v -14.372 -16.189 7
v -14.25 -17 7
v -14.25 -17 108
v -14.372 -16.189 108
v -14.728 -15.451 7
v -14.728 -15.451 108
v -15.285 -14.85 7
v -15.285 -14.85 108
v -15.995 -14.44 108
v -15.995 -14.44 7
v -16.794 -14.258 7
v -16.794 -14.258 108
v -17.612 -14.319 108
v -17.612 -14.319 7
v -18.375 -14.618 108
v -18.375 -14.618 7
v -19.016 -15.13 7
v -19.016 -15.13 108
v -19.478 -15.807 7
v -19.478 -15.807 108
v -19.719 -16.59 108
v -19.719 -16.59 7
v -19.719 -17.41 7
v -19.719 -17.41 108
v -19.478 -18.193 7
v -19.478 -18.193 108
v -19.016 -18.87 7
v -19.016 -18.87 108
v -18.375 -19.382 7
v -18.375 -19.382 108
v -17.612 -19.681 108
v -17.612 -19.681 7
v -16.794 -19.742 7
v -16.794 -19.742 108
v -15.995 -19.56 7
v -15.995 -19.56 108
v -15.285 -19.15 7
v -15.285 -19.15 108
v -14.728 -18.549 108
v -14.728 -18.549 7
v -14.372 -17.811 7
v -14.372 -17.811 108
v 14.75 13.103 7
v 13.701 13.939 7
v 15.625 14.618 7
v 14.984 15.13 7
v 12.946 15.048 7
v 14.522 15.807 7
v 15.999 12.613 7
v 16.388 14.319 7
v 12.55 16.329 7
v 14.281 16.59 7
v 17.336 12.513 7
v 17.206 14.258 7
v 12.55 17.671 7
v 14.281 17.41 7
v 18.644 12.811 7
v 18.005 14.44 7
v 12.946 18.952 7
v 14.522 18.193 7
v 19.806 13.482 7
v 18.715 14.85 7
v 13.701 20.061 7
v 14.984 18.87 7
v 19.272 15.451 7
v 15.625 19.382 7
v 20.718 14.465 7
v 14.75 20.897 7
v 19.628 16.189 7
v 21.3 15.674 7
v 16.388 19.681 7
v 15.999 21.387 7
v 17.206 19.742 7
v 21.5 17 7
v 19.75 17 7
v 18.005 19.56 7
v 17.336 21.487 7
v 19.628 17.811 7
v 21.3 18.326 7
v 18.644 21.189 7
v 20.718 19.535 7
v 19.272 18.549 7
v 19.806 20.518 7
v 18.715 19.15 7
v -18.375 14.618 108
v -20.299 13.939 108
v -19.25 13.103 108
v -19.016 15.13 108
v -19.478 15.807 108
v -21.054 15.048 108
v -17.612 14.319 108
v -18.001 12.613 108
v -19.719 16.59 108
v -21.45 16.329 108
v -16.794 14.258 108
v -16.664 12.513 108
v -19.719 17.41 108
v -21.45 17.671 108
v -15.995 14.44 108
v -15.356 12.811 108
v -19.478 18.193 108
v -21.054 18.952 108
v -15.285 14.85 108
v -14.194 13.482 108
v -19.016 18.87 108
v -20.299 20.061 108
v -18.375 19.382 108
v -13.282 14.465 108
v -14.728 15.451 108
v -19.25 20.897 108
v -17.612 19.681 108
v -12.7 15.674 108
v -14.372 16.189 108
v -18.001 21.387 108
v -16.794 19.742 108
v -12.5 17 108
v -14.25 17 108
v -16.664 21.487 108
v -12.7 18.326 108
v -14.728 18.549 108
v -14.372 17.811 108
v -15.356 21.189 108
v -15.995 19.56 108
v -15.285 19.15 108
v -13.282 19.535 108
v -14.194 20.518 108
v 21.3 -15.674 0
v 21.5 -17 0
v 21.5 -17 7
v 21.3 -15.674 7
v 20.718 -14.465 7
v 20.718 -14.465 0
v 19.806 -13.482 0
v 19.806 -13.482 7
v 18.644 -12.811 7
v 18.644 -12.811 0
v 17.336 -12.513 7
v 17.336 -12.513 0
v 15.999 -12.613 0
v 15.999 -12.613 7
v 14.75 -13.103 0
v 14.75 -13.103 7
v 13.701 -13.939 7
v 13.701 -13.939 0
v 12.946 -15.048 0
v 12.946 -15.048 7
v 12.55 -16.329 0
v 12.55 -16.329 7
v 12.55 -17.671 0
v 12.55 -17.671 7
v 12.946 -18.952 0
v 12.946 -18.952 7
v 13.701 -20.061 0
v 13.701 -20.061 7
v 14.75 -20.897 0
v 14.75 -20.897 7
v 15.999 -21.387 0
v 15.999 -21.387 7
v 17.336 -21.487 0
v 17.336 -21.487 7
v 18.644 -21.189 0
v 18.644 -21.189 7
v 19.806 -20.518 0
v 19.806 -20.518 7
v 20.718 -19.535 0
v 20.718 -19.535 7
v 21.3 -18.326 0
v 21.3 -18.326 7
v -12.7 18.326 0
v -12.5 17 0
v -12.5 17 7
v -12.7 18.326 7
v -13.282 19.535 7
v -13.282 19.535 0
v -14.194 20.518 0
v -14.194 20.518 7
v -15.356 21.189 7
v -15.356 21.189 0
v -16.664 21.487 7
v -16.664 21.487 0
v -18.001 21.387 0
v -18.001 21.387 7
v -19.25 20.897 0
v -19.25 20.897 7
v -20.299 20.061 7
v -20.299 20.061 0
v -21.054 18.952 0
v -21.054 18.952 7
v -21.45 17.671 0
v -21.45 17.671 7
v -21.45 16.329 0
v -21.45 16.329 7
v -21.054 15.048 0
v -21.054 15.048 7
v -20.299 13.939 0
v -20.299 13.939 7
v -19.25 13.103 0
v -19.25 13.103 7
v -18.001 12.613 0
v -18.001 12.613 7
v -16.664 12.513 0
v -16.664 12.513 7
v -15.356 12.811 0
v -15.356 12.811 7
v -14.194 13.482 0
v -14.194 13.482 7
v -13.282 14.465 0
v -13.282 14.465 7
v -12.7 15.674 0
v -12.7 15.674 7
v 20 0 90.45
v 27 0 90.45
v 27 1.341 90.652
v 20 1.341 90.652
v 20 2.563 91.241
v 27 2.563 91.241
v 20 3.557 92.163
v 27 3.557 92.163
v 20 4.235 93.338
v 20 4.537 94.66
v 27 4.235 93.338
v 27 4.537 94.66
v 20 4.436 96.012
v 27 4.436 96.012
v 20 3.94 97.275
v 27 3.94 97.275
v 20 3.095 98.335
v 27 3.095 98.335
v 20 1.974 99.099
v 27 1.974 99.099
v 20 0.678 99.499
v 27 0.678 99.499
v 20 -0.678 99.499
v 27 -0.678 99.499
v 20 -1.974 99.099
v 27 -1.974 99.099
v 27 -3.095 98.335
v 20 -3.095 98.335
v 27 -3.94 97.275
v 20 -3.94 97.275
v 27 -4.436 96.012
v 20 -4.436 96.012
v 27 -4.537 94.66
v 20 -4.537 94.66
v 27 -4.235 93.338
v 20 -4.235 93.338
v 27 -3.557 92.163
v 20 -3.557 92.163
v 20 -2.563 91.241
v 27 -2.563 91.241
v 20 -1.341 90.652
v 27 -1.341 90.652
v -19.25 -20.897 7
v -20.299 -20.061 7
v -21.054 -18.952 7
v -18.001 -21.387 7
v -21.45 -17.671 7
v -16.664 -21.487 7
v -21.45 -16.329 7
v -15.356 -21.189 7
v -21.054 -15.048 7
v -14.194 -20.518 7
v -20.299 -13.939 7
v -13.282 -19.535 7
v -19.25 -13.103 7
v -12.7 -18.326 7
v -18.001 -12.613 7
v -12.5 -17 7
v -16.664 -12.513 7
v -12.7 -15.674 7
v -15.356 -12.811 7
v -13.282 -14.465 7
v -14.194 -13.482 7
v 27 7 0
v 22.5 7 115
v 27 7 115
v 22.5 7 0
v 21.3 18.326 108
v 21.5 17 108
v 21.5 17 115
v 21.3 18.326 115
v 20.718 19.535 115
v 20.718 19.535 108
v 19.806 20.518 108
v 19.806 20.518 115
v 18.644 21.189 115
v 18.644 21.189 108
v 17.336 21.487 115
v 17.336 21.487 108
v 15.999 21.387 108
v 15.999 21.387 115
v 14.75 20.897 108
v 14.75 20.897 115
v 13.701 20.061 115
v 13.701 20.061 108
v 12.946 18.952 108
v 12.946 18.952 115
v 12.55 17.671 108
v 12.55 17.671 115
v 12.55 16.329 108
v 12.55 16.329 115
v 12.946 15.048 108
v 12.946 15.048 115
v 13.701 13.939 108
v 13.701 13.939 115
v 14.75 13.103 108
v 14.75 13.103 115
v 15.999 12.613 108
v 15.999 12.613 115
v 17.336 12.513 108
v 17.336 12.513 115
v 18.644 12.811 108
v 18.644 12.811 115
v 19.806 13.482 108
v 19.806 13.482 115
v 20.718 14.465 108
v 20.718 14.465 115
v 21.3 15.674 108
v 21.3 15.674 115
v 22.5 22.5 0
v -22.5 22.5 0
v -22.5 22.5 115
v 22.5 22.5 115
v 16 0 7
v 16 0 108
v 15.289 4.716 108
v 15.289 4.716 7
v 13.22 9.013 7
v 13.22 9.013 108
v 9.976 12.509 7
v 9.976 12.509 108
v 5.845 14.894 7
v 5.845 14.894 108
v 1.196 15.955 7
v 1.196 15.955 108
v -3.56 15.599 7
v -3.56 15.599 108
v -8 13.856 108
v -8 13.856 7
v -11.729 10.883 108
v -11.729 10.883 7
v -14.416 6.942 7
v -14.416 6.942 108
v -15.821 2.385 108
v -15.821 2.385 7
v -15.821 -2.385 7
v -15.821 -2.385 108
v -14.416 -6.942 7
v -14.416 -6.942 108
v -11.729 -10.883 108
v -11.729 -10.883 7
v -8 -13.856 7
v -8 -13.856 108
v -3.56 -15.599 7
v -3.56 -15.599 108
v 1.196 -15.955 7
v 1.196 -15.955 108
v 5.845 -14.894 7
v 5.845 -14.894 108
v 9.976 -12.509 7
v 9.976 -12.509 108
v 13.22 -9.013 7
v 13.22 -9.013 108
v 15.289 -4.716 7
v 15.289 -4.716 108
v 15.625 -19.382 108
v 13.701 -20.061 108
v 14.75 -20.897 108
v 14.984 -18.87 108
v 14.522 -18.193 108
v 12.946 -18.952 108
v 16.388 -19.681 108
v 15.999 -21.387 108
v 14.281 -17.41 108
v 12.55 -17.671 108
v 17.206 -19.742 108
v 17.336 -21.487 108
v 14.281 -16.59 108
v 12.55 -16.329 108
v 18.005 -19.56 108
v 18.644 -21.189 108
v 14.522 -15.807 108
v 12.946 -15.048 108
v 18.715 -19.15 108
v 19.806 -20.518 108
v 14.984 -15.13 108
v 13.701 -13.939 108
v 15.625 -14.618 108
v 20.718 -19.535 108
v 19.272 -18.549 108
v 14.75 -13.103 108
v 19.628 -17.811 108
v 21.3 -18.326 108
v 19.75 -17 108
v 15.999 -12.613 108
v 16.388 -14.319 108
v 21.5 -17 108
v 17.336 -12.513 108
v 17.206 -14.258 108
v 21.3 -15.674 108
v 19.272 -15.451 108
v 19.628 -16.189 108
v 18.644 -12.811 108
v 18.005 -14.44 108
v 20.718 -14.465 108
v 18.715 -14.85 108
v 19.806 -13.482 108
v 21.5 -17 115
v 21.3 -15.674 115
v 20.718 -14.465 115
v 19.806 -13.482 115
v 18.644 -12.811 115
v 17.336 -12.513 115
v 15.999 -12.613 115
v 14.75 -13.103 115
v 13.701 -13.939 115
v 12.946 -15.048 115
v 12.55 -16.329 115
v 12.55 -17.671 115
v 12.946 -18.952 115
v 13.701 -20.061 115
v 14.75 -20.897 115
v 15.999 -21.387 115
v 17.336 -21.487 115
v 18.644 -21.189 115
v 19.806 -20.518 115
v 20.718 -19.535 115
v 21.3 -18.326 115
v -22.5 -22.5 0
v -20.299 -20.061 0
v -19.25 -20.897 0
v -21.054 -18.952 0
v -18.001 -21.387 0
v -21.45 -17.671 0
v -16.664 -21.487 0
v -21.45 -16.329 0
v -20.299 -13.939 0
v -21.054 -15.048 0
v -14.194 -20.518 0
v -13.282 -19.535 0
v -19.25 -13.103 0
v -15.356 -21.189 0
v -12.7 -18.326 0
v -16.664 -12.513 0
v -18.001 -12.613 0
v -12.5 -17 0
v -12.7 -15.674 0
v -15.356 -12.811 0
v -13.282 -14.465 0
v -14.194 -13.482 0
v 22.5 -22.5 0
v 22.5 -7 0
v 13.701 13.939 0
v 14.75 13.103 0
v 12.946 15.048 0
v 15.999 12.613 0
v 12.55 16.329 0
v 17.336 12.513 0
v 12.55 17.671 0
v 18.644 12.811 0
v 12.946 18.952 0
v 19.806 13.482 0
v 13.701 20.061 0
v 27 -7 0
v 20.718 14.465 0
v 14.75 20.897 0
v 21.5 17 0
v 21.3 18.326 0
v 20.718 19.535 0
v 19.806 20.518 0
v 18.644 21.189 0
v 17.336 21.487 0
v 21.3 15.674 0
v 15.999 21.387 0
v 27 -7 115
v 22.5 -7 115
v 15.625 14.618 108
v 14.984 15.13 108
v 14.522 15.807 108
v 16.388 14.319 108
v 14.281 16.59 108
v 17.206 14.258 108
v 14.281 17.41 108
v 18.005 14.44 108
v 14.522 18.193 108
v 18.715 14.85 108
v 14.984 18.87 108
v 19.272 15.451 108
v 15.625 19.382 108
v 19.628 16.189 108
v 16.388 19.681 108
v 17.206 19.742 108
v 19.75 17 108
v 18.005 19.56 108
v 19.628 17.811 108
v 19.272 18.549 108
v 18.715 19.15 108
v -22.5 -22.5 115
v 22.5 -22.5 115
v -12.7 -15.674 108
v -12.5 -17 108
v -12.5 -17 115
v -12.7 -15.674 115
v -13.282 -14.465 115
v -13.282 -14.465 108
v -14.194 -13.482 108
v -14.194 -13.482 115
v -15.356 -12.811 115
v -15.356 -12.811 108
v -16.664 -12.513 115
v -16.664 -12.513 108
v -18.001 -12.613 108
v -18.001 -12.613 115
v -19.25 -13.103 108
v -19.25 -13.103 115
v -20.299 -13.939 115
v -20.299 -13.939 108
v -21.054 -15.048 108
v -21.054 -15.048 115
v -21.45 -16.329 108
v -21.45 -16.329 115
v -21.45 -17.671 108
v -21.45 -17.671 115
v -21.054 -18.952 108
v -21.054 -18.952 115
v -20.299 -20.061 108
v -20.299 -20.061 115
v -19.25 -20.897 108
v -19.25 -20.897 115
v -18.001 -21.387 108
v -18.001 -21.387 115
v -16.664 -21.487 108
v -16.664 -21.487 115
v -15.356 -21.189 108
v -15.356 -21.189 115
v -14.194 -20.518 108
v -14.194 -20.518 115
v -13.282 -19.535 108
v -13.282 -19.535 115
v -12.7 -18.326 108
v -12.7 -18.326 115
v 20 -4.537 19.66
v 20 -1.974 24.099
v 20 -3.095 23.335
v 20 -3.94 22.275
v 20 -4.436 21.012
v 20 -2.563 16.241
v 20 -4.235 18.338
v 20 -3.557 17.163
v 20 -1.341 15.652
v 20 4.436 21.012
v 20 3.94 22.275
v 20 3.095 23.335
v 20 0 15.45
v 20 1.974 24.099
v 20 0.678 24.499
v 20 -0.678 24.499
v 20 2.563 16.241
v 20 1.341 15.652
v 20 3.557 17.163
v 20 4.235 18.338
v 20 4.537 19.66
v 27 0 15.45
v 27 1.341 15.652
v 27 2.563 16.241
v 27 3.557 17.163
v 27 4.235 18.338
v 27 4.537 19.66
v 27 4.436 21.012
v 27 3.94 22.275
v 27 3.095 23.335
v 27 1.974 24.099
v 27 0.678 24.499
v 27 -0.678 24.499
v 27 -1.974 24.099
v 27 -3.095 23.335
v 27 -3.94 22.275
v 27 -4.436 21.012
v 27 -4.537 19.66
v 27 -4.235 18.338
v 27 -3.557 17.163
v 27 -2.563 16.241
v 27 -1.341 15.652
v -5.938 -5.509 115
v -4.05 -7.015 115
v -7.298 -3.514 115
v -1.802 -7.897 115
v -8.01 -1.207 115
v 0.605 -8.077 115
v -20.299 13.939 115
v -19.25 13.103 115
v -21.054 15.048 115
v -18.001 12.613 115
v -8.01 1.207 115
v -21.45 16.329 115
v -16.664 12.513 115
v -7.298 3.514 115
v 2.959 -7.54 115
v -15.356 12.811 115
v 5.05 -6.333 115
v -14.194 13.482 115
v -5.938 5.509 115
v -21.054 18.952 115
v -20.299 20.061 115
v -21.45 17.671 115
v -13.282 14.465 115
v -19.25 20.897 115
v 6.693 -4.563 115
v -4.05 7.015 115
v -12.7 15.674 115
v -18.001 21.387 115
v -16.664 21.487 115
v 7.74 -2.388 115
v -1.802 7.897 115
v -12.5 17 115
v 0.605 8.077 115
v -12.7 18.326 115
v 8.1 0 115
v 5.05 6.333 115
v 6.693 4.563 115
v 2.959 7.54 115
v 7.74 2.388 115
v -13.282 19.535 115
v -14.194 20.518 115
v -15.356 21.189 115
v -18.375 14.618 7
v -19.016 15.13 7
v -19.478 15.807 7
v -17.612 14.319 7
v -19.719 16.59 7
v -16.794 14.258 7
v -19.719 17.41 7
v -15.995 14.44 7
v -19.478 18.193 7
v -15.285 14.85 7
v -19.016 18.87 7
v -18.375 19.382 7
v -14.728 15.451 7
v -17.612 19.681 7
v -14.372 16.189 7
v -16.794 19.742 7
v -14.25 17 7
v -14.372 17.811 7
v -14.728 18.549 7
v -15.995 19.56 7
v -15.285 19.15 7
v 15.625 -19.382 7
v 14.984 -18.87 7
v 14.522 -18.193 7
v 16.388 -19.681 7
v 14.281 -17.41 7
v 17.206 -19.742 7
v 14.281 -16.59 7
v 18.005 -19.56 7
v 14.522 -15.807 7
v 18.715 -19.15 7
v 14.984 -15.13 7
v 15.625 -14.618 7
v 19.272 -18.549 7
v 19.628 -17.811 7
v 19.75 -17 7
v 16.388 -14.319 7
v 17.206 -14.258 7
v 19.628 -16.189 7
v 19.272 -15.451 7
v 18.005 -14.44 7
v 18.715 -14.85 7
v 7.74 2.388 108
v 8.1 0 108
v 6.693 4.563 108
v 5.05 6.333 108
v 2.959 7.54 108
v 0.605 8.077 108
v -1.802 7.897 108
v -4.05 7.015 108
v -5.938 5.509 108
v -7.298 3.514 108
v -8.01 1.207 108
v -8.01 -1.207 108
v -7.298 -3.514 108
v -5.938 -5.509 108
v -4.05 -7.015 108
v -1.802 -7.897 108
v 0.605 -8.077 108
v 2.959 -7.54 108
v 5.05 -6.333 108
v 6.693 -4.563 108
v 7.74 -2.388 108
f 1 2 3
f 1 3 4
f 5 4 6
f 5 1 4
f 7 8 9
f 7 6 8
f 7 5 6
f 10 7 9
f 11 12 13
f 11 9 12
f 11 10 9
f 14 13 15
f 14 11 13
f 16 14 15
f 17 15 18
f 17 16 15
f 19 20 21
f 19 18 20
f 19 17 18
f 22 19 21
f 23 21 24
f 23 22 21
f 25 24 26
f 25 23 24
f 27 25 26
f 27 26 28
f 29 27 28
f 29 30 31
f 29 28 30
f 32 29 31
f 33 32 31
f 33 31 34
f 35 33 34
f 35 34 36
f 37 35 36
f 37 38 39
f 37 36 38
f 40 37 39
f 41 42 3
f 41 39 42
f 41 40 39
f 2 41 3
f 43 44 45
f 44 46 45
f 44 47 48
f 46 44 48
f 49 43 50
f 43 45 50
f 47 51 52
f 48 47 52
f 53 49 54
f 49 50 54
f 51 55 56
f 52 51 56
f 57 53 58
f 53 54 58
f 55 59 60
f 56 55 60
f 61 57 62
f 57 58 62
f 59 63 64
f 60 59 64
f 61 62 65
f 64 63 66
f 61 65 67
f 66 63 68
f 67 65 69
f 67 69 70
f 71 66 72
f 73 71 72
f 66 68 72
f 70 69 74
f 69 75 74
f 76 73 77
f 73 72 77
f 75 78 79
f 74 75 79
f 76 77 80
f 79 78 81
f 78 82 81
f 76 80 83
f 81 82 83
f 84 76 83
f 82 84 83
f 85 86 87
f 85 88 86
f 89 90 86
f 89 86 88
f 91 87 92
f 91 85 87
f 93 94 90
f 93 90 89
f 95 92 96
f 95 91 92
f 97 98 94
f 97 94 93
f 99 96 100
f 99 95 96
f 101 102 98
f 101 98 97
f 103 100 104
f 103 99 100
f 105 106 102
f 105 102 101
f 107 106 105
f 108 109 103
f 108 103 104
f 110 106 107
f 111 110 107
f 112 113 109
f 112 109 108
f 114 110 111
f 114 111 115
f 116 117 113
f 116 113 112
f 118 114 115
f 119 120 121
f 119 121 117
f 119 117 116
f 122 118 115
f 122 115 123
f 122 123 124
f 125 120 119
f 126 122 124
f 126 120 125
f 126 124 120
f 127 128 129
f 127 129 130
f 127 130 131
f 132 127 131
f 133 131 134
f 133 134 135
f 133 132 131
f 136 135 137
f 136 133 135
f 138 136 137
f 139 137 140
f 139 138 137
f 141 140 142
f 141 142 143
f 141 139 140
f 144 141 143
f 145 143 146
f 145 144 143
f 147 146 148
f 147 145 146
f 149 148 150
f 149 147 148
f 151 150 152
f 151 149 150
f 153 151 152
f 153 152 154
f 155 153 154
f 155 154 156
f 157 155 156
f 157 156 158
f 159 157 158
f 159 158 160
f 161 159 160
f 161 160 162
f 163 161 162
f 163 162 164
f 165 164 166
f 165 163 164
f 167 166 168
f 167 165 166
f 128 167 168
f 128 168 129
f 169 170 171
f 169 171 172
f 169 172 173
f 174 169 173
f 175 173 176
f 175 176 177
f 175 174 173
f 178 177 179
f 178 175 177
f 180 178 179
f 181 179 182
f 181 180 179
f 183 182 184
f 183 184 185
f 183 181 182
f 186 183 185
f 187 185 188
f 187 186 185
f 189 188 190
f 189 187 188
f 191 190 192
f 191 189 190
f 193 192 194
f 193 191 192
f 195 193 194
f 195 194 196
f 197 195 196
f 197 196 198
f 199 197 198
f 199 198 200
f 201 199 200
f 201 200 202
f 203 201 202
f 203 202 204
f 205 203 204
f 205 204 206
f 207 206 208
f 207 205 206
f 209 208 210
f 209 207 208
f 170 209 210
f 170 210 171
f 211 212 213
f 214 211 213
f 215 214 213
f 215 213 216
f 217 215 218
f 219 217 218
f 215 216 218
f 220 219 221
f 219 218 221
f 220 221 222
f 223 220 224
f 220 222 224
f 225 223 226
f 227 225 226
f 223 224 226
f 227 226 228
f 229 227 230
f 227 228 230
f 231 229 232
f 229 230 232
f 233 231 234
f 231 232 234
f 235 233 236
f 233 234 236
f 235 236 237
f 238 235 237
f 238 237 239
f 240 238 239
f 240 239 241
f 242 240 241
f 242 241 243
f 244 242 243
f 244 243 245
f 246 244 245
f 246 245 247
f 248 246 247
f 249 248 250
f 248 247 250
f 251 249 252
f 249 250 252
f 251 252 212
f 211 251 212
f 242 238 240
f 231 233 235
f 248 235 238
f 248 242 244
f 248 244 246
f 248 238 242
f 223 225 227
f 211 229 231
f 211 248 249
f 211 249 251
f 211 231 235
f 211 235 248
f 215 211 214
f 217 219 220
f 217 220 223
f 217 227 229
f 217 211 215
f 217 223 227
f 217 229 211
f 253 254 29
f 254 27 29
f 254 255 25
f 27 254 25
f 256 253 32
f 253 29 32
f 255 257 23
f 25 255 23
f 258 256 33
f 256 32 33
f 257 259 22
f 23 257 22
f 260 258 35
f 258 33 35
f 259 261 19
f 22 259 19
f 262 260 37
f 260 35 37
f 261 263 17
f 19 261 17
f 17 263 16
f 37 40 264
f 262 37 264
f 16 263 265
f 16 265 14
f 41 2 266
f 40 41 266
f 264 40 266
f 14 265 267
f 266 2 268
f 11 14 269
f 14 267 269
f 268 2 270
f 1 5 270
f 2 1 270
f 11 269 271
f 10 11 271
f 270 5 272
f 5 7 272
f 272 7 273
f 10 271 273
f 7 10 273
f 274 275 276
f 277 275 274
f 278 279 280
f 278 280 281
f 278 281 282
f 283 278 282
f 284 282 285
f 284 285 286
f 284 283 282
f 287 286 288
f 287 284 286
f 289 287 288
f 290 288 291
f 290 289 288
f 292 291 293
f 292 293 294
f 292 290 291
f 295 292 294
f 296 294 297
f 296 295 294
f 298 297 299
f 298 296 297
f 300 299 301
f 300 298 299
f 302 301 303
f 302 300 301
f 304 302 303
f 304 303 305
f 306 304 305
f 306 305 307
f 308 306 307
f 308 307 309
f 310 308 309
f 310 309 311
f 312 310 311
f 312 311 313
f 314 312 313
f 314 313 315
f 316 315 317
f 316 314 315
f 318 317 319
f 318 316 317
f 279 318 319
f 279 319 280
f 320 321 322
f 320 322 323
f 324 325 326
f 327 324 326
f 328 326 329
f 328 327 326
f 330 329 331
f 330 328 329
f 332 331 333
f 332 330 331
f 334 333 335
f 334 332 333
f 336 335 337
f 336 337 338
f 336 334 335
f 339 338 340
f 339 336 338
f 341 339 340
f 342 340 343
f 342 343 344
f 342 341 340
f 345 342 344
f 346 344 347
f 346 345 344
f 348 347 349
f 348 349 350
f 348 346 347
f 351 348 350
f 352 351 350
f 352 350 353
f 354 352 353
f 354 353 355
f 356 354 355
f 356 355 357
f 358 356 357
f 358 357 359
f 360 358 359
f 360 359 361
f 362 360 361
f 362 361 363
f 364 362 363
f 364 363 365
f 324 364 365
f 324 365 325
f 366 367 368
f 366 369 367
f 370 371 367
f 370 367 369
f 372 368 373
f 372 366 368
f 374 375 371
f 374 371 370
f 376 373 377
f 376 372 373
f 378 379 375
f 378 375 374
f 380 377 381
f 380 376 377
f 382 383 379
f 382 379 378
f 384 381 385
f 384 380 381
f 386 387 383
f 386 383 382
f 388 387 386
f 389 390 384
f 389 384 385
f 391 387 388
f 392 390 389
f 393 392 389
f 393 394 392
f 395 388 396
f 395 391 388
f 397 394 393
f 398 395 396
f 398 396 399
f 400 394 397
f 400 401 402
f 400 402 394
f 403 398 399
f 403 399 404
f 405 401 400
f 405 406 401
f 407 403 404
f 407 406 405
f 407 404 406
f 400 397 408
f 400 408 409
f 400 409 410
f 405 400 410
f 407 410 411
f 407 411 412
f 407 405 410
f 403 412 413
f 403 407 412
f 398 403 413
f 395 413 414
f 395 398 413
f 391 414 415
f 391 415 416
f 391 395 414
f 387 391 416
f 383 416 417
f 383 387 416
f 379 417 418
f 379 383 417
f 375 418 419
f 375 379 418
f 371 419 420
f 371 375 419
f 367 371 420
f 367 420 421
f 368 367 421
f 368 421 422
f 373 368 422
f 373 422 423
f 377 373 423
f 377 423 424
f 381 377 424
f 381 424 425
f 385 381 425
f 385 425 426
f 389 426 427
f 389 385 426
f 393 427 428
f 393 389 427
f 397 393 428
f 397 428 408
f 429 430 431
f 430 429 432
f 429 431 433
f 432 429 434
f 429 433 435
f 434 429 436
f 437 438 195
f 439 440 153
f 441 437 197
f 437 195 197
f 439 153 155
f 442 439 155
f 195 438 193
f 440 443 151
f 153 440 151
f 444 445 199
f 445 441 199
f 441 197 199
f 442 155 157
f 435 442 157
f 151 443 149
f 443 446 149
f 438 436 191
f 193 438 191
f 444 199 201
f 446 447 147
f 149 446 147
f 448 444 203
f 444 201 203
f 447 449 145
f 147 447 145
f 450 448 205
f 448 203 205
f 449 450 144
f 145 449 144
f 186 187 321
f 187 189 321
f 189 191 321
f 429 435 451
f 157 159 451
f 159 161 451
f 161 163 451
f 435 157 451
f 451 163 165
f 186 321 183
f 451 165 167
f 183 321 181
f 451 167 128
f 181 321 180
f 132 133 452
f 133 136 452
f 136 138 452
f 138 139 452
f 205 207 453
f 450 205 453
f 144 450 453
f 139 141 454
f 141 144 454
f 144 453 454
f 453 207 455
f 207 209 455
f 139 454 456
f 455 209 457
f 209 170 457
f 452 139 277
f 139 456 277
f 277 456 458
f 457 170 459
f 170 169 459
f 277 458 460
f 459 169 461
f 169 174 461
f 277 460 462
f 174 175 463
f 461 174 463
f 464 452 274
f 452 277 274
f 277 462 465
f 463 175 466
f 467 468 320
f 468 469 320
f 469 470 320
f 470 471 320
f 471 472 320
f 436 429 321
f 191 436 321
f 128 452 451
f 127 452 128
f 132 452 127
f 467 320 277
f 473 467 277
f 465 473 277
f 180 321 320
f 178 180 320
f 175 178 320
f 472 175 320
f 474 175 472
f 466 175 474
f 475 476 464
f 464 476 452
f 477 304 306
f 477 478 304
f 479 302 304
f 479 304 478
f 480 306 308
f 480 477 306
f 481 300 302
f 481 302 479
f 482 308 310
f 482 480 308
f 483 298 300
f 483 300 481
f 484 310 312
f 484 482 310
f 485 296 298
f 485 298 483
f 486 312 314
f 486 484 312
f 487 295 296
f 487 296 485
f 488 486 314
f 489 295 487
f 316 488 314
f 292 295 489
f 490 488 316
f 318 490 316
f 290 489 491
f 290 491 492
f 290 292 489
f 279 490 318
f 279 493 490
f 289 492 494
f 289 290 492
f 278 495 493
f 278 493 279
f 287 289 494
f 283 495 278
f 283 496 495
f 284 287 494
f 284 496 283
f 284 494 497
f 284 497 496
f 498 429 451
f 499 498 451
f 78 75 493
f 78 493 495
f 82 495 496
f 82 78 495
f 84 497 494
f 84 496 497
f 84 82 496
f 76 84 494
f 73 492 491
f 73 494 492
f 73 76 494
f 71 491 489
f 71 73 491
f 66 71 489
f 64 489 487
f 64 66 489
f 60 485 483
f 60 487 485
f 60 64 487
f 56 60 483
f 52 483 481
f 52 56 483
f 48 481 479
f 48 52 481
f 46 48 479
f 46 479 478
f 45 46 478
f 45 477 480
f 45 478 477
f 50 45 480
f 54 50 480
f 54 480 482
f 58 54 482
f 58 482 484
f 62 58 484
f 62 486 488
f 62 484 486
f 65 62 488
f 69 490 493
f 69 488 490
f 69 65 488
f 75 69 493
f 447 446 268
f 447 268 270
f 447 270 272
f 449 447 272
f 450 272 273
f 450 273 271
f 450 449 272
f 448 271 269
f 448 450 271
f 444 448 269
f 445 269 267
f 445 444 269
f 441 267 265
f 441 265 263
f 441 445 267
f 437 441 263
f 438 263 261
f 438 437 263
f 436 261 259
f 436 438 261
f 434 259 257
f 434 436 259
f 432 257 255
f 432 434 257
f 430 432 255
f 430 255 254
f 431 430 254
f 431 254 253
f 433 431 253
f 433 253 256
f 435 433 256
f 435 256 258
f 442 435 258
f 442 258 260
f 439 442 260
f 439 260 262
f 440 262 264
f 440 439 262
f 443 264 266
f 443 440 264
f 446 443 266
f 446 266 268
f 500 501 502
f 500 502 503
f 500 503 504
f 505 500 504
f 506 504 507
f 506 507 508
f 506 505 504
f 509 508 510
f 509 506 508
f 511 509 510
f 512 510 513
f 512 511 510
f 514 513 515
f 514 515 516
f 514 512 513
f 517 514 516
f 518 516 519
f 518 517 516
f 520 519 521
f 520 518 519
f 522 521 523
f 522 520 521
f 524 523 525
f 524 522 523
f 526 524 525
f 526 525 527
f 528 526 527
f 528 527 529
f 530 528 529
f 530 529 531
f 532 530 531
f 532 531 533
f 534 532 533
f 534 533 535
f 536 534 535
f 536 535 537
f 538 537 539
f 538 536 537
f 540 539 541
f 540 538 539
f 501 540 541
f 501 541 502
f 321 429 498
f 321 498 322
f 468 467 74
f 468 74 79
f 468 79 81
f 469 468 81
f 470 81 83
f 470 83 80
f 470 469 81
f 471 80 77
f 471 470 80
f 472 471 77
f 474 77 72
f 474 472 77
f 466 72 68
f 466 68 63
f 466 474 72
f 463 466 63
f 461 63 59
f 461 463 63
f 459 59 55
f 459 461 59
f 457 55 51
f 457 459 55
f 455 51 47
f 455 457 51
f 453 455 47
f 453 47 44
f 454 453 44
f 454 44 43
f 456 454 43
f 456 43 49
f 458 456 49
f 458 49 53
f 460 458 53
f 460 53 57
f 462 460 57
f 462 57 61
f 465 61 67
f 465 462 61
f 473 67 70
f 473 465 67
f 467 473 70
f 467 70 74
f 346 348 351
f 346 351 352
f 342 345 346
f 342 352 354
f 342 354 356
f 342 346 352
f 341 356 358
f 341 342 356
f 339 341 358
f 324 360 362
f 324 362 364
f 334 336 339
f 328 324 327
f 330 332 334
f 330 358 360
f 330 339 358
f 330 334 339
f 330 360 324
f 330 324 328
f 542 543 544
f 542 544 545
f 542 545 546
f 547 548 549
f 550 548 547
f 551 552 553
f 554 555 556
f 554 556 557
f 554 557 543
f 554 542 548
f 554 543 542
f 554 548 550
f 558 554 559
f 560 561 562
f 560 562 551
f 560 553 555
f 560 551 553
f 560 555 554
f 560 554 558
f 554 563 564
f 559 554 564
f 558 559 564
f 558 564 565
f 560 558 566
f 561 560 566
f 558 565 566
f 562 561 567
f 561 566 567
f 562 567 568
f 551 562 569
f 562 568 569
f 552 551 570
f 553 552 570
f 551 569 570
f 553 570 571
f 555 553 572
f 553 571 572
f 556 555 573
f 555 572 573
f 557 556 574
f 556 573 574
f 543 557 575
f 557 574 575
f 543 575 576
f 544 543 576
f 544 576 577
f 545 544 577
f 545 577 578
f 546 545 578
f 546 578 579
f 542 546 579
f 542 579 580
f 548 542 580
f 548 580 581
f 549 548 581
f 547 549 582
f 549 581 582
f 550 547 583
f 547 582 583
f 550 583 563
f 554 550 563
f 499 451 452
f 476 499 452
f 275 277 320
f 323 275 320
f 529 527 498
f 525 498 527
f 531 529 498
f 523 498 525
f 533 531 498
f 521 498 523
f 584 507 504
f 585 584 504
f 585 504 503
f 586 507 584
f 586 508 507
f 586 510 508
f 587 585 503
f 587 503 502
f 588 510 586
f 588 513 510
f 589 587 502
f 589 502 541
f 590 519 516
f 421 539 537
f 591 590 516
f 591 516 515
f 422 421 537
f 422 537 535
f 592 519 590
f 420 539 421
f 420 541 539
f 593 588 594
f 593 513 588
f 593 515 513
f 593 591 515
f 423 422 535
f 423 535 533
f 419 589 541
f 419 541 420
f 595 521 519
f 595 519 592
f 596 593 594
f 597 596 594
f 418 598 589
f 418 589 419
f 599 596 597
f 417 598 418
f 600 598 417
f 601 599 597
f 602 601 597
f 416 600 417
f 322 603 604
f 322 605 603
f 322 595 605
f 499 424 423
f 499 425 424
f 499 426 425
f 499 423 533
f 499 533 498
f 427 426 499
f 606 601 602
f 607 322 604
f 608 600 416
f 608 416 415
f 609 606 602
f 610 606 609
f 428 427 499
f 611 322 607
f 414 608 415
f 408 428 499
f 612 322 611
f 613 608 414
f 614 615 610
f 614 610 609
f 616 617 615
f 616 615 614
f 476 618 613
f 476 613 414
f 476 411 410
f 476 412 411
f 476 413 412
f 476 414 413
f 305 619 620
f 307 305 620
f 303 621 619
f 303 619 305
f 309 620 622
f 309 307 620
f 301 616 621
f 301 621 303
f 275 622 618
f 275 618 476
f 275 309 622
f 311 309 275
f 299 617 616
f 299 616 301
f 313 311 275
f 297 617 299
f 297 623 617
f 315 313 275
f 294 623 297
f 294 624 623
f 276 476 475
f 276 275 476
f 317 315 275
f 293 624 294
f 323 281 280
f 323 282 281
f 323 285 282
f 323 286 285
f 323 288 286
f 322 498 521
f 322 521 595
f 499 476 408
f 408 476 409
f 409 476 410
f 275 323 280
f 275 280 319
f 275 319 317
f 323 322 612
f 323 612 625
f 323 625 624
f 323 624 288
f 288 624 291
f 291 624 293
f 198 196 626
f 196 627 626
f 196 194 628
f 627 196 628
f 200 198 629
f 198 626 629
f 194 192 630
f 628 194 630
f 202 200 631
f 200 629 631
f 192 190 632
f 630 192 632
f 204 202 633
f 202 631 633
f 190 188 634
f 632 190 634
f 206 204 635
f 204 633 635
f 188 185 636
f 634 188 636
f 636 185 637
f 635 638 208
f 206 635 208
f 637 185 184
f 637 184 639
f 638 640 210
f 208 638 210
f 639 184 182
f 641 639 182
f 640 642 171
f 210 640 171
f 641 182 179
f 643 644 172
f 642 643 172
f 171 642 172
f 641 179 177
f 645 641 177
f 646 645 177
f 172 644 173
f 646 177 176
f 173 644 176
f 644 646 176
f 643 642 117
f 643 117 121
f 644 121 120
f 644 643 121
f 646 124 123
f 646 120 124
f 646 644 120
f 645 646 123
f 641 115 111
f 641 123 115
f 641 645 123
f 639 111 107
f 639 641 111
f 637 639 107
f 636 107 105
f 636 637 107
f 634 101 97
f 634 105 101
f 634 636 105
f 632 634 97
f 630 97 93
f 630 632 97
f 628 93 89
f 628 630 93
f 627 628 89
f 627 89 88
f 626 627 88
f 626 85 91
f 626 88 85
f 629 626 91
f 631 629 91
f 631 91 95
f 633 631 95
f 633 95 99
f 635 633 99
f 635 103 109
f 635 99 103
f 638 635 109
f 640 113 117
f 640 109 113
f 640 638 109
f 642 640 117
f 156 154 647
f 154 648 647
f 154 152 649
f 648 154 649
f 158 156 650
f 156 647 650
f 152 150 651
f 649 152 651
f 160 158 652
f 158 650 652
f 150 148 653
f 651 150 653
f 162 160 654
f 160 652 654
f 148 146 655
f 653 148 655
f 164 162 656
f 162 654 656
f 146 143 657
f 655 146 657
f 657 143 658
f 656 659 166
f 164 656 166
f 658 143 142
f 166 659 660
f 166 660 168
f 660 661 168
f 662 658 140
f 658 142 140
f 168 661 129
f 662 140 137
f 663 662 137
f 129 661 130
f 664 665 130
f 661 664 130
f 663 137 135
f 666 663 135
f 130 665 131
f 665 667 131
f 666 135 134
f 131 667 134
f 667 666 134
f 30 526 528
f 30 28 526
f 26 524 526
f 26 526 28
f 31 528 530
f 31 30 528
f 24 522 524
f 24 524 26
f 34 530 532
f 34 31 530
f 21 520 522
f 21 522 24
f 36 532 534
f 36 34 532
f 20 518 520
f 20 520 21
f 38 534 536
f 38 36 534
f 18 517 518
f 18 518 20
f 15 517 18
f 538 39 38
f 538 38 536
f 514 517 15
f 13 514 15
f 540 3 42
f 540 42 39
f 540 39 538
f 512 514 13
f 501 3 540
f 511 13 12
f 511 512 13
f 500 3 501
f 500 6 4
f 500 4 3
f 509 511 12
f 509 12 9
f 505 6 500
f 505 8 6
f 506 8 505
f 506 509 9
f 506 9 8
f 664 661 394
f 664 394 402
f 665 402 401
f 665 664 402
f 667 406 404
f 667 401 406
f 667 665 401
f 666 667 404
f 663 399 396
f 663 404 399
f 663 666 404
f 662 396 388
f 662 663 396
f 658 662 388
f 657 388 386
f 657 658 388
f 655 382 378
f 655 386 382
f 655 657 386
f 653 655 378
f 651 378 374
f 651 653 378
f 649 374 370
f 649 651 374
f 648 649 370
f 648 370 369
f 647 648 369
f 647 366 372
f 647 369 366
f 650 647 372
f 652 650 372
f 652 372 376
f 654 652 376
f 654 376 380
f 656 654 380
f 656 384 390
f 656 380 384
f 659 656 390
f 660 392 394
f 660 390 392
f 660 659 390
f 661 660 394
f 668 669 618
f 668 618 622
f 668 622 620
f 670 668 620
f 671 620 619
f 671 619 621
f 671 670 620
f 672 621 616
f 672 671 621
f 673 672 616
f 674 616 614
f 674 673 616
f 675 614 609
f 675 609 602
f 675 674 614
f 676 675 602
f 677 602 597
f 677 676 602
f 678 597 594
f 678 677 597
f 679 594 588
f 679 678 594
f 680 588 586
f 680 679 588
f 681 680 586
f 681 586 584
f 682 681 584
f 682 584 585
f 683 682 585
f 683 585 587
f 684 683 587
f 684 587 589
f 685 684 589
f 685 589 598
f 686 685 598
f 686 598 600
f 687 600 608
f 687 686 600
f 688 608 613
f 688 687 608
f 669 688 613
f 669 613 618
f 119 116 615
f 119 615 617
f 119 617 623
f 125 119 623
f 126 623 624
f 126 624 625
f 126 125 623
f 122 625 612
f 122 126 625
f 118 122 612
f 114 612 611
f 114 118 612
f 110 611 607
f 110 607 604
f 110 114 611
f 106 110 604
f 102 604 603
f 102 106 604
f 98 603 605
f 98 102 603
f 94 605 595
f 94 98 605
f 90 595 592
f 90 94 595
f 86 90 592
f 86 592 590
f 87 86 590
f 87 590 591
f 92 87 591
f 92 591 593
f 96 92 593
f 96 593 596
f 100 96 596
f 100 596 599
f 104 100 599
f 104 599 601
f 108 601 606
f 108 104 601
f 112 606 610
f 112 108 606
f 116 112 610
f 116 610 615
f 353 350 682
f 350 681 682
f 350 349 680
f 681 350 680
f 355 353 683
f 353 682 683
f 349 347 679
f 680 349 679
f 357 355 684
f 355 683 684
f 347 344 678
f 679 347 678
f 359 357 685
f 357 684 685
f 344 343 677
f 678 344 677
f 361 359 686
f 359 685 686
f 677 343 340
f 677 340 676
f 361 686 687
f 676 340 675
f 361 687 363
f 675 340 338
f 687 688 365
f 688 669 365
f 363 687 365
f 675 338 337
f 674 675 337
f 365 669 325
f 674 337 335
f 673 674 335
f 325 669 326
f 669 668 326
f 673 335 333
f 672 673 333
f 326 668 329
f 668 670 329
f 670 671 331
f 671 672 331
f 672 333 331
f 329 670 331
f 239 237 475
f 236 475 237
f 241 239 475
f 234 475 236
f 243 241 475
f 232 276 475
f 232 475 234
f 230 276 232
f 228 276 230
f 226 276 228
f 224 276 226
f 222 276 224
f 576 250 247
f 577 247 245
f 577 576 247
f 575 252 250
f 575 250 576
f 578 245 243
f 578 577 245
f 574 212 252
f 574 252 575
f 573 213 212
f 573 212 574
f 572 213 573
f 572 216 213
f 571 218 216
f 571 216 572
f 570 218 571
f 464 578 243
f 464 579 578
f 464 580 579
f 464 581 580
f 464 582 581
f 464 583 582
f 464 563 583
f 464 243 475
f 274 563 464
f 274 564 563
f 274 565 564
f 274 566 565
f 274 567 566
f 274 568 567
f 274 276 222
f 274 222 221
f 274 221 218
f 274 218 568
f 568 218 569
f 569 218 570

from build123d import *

# Parameters (mm, degrees)
SKETCH1_W                                      = 45
SKETCH1_H                                      = 45
SKETCH1_R                                      = 2.75
SKETCH1_R_2                                    = 16
SMC_45_MM_SQUARE_BODY_AND_FOUR_5_5_MM_TH_DEPTH = 115
SKETCH2_R                                      = 16
HEAD_END_CLEARANCE_ENVELOPE_DEPTH              = 7
ROD_START                                      = 108
SKETCH3_R                                      = 16
SKETCH3_R_2                                    = 8.1
ROD_COVER_AND_16_MM_ROD_CLEARANCE_DEPTH        = 7
SKETCH4_R                                      = 4.5
REAR_BOLT_HEAD_COUNTERBORES_DEPTH              = 7
FRONT_START                                    = 108
SKETCH5_R                                      = 4.5
FRONT_MOUNTING_COUNTERBORES_DEPTH              = 7
CATALOG_START                                  = 22.4
SKETCH6_W                                      = 115
SKETCH6_H                                      = 14
CATALOG_14_MM_WIDE_PORT_BOSS_PROJECTION_DEPTH  = 4.6
TOP_START                                      = 27
SKETCH7_R                                      = 4.55
TOP_RC_1_8_PORTS_20_MM_FROM_EACH_END_DEPTH     = 7


with BuildPart() as part:
    # Sketch1 → SMC 45 mm square body and four 5.5 mm through holes (new body)
    with BuildSketch(Plane.XY):
        Rectangle(SKETCH1_W, SKETCH1_H)
        with Locations((-17, -17)):
            Circle(SKETCH1_R, mode=Mode.SUBTRACT)
        with Locations((-17, 17)):
            Circle(SKETCH1_R, mode=Mode.SUBTRACT)
        with Locations((17, -17)):
            Circle(SKETCH1_R, mode=Mode.SUBTRACT)
        with Locations((17, 17)):
            Circle(SKETCH1_R, mode=Mode.SUBTRACT)
        Circle(SKETCH1_R_2, mode=Mode.SUBTRACT)
    extrude(amount=SMC_45_MM_SQUARE_BODY_AND_FOUR_5_5_MM_TH_DEPTH)

    # Sketch2 → Head end clearance envelope (add)
    with BuildSketch(Plane.XY):
        Circle(SKETCH2_R)
    extrude(amount=HEAD_END_CLEARANCE_ENVELOPE_DEPTH)

    # Sketch3 → Rod cover and 16 mm rod clearance (add)
    with BuildSketch(Plane.XY.offset(ROD_START)):
        Circle(SKETCH3_R)
        Circle(SKETCH3_R_2, mode=Mode.SUBTRACT)
    extrude(amount=ROD_COVER_AND_16_MM_ROD_CLEARANCE_DEPTH)

    # Sketch4 → Rear bolt head counterbores (cut)
    with BuildSketch(Plane.XY):
        with Locations((-17, -17)):
            Circle(SKETCH4_R)
        with Locations((-17, 17)):
            Circle(SKETCH4_R)
        with Locations((17, -17)):
            Circle(SKETCH4_R)
        with Locations((17, 17)):
            Circle(SKETCH4_R)
    extrude(amount=REAR_BOLT_HEAD_COUNTERBORES_DEPTH, mode=Mode.SUBTRACT)

    # Sketch5 → Front mounting counterbores (cut)
    with BuildSketch(Plane.XY.offset(FRONT_START)):
        with Locations((-17, -17)):
            Circle(SKETCH5_R)
        with Locations((-17, 17)):
            Circle(SKETCH5_R)
        with Locations((17, -17)):
            Circle(SKETCH5_R)
        with Locations((17, 17)):
            Circle(SKETCH5_R)
    extrude(amount=FRONT_MOUNTING_COUNTERBORES_DEPTH, mode=Mode.SUBTRACT)

    # Sketch6 → Catalog 14 mm wide port boss projection (add)
    with BuildSketch(Plane(origin=(0, 0, 0), x_dir=(0, 0, -1), z_dir=(1, 0, 0)).offset(CATALOG_START)):
        with Locations((-57.5, 0)):
            Rectangle(SKETCH6_W, SKETCH6_H)
    extrude(amount=CATALOG_14_MM_WIDE_PORT_BOSS_PROJECTION_DEPTH)

    # Sketch7 → Top Rc 1/8 ports, 20 mm from each end (cut)
    with BuildSketch(Plane(origin=(0, 0, 0), x_dir=(0, 0, -1), z_dir=(1, 0, 0)).offset(TOP_START)):
        with Locations((-20, 0)):
            Circle(SKETCH7_R)
        with Locations((-95, 0)):
            Circle(SKETCH7_R)
    extrude(amount=-TOP_RC_1_8_PORTS_20_MM_FROM_EACH_END_DEPTH, mode=Mode.SUBTRACT)


solid = part.part
